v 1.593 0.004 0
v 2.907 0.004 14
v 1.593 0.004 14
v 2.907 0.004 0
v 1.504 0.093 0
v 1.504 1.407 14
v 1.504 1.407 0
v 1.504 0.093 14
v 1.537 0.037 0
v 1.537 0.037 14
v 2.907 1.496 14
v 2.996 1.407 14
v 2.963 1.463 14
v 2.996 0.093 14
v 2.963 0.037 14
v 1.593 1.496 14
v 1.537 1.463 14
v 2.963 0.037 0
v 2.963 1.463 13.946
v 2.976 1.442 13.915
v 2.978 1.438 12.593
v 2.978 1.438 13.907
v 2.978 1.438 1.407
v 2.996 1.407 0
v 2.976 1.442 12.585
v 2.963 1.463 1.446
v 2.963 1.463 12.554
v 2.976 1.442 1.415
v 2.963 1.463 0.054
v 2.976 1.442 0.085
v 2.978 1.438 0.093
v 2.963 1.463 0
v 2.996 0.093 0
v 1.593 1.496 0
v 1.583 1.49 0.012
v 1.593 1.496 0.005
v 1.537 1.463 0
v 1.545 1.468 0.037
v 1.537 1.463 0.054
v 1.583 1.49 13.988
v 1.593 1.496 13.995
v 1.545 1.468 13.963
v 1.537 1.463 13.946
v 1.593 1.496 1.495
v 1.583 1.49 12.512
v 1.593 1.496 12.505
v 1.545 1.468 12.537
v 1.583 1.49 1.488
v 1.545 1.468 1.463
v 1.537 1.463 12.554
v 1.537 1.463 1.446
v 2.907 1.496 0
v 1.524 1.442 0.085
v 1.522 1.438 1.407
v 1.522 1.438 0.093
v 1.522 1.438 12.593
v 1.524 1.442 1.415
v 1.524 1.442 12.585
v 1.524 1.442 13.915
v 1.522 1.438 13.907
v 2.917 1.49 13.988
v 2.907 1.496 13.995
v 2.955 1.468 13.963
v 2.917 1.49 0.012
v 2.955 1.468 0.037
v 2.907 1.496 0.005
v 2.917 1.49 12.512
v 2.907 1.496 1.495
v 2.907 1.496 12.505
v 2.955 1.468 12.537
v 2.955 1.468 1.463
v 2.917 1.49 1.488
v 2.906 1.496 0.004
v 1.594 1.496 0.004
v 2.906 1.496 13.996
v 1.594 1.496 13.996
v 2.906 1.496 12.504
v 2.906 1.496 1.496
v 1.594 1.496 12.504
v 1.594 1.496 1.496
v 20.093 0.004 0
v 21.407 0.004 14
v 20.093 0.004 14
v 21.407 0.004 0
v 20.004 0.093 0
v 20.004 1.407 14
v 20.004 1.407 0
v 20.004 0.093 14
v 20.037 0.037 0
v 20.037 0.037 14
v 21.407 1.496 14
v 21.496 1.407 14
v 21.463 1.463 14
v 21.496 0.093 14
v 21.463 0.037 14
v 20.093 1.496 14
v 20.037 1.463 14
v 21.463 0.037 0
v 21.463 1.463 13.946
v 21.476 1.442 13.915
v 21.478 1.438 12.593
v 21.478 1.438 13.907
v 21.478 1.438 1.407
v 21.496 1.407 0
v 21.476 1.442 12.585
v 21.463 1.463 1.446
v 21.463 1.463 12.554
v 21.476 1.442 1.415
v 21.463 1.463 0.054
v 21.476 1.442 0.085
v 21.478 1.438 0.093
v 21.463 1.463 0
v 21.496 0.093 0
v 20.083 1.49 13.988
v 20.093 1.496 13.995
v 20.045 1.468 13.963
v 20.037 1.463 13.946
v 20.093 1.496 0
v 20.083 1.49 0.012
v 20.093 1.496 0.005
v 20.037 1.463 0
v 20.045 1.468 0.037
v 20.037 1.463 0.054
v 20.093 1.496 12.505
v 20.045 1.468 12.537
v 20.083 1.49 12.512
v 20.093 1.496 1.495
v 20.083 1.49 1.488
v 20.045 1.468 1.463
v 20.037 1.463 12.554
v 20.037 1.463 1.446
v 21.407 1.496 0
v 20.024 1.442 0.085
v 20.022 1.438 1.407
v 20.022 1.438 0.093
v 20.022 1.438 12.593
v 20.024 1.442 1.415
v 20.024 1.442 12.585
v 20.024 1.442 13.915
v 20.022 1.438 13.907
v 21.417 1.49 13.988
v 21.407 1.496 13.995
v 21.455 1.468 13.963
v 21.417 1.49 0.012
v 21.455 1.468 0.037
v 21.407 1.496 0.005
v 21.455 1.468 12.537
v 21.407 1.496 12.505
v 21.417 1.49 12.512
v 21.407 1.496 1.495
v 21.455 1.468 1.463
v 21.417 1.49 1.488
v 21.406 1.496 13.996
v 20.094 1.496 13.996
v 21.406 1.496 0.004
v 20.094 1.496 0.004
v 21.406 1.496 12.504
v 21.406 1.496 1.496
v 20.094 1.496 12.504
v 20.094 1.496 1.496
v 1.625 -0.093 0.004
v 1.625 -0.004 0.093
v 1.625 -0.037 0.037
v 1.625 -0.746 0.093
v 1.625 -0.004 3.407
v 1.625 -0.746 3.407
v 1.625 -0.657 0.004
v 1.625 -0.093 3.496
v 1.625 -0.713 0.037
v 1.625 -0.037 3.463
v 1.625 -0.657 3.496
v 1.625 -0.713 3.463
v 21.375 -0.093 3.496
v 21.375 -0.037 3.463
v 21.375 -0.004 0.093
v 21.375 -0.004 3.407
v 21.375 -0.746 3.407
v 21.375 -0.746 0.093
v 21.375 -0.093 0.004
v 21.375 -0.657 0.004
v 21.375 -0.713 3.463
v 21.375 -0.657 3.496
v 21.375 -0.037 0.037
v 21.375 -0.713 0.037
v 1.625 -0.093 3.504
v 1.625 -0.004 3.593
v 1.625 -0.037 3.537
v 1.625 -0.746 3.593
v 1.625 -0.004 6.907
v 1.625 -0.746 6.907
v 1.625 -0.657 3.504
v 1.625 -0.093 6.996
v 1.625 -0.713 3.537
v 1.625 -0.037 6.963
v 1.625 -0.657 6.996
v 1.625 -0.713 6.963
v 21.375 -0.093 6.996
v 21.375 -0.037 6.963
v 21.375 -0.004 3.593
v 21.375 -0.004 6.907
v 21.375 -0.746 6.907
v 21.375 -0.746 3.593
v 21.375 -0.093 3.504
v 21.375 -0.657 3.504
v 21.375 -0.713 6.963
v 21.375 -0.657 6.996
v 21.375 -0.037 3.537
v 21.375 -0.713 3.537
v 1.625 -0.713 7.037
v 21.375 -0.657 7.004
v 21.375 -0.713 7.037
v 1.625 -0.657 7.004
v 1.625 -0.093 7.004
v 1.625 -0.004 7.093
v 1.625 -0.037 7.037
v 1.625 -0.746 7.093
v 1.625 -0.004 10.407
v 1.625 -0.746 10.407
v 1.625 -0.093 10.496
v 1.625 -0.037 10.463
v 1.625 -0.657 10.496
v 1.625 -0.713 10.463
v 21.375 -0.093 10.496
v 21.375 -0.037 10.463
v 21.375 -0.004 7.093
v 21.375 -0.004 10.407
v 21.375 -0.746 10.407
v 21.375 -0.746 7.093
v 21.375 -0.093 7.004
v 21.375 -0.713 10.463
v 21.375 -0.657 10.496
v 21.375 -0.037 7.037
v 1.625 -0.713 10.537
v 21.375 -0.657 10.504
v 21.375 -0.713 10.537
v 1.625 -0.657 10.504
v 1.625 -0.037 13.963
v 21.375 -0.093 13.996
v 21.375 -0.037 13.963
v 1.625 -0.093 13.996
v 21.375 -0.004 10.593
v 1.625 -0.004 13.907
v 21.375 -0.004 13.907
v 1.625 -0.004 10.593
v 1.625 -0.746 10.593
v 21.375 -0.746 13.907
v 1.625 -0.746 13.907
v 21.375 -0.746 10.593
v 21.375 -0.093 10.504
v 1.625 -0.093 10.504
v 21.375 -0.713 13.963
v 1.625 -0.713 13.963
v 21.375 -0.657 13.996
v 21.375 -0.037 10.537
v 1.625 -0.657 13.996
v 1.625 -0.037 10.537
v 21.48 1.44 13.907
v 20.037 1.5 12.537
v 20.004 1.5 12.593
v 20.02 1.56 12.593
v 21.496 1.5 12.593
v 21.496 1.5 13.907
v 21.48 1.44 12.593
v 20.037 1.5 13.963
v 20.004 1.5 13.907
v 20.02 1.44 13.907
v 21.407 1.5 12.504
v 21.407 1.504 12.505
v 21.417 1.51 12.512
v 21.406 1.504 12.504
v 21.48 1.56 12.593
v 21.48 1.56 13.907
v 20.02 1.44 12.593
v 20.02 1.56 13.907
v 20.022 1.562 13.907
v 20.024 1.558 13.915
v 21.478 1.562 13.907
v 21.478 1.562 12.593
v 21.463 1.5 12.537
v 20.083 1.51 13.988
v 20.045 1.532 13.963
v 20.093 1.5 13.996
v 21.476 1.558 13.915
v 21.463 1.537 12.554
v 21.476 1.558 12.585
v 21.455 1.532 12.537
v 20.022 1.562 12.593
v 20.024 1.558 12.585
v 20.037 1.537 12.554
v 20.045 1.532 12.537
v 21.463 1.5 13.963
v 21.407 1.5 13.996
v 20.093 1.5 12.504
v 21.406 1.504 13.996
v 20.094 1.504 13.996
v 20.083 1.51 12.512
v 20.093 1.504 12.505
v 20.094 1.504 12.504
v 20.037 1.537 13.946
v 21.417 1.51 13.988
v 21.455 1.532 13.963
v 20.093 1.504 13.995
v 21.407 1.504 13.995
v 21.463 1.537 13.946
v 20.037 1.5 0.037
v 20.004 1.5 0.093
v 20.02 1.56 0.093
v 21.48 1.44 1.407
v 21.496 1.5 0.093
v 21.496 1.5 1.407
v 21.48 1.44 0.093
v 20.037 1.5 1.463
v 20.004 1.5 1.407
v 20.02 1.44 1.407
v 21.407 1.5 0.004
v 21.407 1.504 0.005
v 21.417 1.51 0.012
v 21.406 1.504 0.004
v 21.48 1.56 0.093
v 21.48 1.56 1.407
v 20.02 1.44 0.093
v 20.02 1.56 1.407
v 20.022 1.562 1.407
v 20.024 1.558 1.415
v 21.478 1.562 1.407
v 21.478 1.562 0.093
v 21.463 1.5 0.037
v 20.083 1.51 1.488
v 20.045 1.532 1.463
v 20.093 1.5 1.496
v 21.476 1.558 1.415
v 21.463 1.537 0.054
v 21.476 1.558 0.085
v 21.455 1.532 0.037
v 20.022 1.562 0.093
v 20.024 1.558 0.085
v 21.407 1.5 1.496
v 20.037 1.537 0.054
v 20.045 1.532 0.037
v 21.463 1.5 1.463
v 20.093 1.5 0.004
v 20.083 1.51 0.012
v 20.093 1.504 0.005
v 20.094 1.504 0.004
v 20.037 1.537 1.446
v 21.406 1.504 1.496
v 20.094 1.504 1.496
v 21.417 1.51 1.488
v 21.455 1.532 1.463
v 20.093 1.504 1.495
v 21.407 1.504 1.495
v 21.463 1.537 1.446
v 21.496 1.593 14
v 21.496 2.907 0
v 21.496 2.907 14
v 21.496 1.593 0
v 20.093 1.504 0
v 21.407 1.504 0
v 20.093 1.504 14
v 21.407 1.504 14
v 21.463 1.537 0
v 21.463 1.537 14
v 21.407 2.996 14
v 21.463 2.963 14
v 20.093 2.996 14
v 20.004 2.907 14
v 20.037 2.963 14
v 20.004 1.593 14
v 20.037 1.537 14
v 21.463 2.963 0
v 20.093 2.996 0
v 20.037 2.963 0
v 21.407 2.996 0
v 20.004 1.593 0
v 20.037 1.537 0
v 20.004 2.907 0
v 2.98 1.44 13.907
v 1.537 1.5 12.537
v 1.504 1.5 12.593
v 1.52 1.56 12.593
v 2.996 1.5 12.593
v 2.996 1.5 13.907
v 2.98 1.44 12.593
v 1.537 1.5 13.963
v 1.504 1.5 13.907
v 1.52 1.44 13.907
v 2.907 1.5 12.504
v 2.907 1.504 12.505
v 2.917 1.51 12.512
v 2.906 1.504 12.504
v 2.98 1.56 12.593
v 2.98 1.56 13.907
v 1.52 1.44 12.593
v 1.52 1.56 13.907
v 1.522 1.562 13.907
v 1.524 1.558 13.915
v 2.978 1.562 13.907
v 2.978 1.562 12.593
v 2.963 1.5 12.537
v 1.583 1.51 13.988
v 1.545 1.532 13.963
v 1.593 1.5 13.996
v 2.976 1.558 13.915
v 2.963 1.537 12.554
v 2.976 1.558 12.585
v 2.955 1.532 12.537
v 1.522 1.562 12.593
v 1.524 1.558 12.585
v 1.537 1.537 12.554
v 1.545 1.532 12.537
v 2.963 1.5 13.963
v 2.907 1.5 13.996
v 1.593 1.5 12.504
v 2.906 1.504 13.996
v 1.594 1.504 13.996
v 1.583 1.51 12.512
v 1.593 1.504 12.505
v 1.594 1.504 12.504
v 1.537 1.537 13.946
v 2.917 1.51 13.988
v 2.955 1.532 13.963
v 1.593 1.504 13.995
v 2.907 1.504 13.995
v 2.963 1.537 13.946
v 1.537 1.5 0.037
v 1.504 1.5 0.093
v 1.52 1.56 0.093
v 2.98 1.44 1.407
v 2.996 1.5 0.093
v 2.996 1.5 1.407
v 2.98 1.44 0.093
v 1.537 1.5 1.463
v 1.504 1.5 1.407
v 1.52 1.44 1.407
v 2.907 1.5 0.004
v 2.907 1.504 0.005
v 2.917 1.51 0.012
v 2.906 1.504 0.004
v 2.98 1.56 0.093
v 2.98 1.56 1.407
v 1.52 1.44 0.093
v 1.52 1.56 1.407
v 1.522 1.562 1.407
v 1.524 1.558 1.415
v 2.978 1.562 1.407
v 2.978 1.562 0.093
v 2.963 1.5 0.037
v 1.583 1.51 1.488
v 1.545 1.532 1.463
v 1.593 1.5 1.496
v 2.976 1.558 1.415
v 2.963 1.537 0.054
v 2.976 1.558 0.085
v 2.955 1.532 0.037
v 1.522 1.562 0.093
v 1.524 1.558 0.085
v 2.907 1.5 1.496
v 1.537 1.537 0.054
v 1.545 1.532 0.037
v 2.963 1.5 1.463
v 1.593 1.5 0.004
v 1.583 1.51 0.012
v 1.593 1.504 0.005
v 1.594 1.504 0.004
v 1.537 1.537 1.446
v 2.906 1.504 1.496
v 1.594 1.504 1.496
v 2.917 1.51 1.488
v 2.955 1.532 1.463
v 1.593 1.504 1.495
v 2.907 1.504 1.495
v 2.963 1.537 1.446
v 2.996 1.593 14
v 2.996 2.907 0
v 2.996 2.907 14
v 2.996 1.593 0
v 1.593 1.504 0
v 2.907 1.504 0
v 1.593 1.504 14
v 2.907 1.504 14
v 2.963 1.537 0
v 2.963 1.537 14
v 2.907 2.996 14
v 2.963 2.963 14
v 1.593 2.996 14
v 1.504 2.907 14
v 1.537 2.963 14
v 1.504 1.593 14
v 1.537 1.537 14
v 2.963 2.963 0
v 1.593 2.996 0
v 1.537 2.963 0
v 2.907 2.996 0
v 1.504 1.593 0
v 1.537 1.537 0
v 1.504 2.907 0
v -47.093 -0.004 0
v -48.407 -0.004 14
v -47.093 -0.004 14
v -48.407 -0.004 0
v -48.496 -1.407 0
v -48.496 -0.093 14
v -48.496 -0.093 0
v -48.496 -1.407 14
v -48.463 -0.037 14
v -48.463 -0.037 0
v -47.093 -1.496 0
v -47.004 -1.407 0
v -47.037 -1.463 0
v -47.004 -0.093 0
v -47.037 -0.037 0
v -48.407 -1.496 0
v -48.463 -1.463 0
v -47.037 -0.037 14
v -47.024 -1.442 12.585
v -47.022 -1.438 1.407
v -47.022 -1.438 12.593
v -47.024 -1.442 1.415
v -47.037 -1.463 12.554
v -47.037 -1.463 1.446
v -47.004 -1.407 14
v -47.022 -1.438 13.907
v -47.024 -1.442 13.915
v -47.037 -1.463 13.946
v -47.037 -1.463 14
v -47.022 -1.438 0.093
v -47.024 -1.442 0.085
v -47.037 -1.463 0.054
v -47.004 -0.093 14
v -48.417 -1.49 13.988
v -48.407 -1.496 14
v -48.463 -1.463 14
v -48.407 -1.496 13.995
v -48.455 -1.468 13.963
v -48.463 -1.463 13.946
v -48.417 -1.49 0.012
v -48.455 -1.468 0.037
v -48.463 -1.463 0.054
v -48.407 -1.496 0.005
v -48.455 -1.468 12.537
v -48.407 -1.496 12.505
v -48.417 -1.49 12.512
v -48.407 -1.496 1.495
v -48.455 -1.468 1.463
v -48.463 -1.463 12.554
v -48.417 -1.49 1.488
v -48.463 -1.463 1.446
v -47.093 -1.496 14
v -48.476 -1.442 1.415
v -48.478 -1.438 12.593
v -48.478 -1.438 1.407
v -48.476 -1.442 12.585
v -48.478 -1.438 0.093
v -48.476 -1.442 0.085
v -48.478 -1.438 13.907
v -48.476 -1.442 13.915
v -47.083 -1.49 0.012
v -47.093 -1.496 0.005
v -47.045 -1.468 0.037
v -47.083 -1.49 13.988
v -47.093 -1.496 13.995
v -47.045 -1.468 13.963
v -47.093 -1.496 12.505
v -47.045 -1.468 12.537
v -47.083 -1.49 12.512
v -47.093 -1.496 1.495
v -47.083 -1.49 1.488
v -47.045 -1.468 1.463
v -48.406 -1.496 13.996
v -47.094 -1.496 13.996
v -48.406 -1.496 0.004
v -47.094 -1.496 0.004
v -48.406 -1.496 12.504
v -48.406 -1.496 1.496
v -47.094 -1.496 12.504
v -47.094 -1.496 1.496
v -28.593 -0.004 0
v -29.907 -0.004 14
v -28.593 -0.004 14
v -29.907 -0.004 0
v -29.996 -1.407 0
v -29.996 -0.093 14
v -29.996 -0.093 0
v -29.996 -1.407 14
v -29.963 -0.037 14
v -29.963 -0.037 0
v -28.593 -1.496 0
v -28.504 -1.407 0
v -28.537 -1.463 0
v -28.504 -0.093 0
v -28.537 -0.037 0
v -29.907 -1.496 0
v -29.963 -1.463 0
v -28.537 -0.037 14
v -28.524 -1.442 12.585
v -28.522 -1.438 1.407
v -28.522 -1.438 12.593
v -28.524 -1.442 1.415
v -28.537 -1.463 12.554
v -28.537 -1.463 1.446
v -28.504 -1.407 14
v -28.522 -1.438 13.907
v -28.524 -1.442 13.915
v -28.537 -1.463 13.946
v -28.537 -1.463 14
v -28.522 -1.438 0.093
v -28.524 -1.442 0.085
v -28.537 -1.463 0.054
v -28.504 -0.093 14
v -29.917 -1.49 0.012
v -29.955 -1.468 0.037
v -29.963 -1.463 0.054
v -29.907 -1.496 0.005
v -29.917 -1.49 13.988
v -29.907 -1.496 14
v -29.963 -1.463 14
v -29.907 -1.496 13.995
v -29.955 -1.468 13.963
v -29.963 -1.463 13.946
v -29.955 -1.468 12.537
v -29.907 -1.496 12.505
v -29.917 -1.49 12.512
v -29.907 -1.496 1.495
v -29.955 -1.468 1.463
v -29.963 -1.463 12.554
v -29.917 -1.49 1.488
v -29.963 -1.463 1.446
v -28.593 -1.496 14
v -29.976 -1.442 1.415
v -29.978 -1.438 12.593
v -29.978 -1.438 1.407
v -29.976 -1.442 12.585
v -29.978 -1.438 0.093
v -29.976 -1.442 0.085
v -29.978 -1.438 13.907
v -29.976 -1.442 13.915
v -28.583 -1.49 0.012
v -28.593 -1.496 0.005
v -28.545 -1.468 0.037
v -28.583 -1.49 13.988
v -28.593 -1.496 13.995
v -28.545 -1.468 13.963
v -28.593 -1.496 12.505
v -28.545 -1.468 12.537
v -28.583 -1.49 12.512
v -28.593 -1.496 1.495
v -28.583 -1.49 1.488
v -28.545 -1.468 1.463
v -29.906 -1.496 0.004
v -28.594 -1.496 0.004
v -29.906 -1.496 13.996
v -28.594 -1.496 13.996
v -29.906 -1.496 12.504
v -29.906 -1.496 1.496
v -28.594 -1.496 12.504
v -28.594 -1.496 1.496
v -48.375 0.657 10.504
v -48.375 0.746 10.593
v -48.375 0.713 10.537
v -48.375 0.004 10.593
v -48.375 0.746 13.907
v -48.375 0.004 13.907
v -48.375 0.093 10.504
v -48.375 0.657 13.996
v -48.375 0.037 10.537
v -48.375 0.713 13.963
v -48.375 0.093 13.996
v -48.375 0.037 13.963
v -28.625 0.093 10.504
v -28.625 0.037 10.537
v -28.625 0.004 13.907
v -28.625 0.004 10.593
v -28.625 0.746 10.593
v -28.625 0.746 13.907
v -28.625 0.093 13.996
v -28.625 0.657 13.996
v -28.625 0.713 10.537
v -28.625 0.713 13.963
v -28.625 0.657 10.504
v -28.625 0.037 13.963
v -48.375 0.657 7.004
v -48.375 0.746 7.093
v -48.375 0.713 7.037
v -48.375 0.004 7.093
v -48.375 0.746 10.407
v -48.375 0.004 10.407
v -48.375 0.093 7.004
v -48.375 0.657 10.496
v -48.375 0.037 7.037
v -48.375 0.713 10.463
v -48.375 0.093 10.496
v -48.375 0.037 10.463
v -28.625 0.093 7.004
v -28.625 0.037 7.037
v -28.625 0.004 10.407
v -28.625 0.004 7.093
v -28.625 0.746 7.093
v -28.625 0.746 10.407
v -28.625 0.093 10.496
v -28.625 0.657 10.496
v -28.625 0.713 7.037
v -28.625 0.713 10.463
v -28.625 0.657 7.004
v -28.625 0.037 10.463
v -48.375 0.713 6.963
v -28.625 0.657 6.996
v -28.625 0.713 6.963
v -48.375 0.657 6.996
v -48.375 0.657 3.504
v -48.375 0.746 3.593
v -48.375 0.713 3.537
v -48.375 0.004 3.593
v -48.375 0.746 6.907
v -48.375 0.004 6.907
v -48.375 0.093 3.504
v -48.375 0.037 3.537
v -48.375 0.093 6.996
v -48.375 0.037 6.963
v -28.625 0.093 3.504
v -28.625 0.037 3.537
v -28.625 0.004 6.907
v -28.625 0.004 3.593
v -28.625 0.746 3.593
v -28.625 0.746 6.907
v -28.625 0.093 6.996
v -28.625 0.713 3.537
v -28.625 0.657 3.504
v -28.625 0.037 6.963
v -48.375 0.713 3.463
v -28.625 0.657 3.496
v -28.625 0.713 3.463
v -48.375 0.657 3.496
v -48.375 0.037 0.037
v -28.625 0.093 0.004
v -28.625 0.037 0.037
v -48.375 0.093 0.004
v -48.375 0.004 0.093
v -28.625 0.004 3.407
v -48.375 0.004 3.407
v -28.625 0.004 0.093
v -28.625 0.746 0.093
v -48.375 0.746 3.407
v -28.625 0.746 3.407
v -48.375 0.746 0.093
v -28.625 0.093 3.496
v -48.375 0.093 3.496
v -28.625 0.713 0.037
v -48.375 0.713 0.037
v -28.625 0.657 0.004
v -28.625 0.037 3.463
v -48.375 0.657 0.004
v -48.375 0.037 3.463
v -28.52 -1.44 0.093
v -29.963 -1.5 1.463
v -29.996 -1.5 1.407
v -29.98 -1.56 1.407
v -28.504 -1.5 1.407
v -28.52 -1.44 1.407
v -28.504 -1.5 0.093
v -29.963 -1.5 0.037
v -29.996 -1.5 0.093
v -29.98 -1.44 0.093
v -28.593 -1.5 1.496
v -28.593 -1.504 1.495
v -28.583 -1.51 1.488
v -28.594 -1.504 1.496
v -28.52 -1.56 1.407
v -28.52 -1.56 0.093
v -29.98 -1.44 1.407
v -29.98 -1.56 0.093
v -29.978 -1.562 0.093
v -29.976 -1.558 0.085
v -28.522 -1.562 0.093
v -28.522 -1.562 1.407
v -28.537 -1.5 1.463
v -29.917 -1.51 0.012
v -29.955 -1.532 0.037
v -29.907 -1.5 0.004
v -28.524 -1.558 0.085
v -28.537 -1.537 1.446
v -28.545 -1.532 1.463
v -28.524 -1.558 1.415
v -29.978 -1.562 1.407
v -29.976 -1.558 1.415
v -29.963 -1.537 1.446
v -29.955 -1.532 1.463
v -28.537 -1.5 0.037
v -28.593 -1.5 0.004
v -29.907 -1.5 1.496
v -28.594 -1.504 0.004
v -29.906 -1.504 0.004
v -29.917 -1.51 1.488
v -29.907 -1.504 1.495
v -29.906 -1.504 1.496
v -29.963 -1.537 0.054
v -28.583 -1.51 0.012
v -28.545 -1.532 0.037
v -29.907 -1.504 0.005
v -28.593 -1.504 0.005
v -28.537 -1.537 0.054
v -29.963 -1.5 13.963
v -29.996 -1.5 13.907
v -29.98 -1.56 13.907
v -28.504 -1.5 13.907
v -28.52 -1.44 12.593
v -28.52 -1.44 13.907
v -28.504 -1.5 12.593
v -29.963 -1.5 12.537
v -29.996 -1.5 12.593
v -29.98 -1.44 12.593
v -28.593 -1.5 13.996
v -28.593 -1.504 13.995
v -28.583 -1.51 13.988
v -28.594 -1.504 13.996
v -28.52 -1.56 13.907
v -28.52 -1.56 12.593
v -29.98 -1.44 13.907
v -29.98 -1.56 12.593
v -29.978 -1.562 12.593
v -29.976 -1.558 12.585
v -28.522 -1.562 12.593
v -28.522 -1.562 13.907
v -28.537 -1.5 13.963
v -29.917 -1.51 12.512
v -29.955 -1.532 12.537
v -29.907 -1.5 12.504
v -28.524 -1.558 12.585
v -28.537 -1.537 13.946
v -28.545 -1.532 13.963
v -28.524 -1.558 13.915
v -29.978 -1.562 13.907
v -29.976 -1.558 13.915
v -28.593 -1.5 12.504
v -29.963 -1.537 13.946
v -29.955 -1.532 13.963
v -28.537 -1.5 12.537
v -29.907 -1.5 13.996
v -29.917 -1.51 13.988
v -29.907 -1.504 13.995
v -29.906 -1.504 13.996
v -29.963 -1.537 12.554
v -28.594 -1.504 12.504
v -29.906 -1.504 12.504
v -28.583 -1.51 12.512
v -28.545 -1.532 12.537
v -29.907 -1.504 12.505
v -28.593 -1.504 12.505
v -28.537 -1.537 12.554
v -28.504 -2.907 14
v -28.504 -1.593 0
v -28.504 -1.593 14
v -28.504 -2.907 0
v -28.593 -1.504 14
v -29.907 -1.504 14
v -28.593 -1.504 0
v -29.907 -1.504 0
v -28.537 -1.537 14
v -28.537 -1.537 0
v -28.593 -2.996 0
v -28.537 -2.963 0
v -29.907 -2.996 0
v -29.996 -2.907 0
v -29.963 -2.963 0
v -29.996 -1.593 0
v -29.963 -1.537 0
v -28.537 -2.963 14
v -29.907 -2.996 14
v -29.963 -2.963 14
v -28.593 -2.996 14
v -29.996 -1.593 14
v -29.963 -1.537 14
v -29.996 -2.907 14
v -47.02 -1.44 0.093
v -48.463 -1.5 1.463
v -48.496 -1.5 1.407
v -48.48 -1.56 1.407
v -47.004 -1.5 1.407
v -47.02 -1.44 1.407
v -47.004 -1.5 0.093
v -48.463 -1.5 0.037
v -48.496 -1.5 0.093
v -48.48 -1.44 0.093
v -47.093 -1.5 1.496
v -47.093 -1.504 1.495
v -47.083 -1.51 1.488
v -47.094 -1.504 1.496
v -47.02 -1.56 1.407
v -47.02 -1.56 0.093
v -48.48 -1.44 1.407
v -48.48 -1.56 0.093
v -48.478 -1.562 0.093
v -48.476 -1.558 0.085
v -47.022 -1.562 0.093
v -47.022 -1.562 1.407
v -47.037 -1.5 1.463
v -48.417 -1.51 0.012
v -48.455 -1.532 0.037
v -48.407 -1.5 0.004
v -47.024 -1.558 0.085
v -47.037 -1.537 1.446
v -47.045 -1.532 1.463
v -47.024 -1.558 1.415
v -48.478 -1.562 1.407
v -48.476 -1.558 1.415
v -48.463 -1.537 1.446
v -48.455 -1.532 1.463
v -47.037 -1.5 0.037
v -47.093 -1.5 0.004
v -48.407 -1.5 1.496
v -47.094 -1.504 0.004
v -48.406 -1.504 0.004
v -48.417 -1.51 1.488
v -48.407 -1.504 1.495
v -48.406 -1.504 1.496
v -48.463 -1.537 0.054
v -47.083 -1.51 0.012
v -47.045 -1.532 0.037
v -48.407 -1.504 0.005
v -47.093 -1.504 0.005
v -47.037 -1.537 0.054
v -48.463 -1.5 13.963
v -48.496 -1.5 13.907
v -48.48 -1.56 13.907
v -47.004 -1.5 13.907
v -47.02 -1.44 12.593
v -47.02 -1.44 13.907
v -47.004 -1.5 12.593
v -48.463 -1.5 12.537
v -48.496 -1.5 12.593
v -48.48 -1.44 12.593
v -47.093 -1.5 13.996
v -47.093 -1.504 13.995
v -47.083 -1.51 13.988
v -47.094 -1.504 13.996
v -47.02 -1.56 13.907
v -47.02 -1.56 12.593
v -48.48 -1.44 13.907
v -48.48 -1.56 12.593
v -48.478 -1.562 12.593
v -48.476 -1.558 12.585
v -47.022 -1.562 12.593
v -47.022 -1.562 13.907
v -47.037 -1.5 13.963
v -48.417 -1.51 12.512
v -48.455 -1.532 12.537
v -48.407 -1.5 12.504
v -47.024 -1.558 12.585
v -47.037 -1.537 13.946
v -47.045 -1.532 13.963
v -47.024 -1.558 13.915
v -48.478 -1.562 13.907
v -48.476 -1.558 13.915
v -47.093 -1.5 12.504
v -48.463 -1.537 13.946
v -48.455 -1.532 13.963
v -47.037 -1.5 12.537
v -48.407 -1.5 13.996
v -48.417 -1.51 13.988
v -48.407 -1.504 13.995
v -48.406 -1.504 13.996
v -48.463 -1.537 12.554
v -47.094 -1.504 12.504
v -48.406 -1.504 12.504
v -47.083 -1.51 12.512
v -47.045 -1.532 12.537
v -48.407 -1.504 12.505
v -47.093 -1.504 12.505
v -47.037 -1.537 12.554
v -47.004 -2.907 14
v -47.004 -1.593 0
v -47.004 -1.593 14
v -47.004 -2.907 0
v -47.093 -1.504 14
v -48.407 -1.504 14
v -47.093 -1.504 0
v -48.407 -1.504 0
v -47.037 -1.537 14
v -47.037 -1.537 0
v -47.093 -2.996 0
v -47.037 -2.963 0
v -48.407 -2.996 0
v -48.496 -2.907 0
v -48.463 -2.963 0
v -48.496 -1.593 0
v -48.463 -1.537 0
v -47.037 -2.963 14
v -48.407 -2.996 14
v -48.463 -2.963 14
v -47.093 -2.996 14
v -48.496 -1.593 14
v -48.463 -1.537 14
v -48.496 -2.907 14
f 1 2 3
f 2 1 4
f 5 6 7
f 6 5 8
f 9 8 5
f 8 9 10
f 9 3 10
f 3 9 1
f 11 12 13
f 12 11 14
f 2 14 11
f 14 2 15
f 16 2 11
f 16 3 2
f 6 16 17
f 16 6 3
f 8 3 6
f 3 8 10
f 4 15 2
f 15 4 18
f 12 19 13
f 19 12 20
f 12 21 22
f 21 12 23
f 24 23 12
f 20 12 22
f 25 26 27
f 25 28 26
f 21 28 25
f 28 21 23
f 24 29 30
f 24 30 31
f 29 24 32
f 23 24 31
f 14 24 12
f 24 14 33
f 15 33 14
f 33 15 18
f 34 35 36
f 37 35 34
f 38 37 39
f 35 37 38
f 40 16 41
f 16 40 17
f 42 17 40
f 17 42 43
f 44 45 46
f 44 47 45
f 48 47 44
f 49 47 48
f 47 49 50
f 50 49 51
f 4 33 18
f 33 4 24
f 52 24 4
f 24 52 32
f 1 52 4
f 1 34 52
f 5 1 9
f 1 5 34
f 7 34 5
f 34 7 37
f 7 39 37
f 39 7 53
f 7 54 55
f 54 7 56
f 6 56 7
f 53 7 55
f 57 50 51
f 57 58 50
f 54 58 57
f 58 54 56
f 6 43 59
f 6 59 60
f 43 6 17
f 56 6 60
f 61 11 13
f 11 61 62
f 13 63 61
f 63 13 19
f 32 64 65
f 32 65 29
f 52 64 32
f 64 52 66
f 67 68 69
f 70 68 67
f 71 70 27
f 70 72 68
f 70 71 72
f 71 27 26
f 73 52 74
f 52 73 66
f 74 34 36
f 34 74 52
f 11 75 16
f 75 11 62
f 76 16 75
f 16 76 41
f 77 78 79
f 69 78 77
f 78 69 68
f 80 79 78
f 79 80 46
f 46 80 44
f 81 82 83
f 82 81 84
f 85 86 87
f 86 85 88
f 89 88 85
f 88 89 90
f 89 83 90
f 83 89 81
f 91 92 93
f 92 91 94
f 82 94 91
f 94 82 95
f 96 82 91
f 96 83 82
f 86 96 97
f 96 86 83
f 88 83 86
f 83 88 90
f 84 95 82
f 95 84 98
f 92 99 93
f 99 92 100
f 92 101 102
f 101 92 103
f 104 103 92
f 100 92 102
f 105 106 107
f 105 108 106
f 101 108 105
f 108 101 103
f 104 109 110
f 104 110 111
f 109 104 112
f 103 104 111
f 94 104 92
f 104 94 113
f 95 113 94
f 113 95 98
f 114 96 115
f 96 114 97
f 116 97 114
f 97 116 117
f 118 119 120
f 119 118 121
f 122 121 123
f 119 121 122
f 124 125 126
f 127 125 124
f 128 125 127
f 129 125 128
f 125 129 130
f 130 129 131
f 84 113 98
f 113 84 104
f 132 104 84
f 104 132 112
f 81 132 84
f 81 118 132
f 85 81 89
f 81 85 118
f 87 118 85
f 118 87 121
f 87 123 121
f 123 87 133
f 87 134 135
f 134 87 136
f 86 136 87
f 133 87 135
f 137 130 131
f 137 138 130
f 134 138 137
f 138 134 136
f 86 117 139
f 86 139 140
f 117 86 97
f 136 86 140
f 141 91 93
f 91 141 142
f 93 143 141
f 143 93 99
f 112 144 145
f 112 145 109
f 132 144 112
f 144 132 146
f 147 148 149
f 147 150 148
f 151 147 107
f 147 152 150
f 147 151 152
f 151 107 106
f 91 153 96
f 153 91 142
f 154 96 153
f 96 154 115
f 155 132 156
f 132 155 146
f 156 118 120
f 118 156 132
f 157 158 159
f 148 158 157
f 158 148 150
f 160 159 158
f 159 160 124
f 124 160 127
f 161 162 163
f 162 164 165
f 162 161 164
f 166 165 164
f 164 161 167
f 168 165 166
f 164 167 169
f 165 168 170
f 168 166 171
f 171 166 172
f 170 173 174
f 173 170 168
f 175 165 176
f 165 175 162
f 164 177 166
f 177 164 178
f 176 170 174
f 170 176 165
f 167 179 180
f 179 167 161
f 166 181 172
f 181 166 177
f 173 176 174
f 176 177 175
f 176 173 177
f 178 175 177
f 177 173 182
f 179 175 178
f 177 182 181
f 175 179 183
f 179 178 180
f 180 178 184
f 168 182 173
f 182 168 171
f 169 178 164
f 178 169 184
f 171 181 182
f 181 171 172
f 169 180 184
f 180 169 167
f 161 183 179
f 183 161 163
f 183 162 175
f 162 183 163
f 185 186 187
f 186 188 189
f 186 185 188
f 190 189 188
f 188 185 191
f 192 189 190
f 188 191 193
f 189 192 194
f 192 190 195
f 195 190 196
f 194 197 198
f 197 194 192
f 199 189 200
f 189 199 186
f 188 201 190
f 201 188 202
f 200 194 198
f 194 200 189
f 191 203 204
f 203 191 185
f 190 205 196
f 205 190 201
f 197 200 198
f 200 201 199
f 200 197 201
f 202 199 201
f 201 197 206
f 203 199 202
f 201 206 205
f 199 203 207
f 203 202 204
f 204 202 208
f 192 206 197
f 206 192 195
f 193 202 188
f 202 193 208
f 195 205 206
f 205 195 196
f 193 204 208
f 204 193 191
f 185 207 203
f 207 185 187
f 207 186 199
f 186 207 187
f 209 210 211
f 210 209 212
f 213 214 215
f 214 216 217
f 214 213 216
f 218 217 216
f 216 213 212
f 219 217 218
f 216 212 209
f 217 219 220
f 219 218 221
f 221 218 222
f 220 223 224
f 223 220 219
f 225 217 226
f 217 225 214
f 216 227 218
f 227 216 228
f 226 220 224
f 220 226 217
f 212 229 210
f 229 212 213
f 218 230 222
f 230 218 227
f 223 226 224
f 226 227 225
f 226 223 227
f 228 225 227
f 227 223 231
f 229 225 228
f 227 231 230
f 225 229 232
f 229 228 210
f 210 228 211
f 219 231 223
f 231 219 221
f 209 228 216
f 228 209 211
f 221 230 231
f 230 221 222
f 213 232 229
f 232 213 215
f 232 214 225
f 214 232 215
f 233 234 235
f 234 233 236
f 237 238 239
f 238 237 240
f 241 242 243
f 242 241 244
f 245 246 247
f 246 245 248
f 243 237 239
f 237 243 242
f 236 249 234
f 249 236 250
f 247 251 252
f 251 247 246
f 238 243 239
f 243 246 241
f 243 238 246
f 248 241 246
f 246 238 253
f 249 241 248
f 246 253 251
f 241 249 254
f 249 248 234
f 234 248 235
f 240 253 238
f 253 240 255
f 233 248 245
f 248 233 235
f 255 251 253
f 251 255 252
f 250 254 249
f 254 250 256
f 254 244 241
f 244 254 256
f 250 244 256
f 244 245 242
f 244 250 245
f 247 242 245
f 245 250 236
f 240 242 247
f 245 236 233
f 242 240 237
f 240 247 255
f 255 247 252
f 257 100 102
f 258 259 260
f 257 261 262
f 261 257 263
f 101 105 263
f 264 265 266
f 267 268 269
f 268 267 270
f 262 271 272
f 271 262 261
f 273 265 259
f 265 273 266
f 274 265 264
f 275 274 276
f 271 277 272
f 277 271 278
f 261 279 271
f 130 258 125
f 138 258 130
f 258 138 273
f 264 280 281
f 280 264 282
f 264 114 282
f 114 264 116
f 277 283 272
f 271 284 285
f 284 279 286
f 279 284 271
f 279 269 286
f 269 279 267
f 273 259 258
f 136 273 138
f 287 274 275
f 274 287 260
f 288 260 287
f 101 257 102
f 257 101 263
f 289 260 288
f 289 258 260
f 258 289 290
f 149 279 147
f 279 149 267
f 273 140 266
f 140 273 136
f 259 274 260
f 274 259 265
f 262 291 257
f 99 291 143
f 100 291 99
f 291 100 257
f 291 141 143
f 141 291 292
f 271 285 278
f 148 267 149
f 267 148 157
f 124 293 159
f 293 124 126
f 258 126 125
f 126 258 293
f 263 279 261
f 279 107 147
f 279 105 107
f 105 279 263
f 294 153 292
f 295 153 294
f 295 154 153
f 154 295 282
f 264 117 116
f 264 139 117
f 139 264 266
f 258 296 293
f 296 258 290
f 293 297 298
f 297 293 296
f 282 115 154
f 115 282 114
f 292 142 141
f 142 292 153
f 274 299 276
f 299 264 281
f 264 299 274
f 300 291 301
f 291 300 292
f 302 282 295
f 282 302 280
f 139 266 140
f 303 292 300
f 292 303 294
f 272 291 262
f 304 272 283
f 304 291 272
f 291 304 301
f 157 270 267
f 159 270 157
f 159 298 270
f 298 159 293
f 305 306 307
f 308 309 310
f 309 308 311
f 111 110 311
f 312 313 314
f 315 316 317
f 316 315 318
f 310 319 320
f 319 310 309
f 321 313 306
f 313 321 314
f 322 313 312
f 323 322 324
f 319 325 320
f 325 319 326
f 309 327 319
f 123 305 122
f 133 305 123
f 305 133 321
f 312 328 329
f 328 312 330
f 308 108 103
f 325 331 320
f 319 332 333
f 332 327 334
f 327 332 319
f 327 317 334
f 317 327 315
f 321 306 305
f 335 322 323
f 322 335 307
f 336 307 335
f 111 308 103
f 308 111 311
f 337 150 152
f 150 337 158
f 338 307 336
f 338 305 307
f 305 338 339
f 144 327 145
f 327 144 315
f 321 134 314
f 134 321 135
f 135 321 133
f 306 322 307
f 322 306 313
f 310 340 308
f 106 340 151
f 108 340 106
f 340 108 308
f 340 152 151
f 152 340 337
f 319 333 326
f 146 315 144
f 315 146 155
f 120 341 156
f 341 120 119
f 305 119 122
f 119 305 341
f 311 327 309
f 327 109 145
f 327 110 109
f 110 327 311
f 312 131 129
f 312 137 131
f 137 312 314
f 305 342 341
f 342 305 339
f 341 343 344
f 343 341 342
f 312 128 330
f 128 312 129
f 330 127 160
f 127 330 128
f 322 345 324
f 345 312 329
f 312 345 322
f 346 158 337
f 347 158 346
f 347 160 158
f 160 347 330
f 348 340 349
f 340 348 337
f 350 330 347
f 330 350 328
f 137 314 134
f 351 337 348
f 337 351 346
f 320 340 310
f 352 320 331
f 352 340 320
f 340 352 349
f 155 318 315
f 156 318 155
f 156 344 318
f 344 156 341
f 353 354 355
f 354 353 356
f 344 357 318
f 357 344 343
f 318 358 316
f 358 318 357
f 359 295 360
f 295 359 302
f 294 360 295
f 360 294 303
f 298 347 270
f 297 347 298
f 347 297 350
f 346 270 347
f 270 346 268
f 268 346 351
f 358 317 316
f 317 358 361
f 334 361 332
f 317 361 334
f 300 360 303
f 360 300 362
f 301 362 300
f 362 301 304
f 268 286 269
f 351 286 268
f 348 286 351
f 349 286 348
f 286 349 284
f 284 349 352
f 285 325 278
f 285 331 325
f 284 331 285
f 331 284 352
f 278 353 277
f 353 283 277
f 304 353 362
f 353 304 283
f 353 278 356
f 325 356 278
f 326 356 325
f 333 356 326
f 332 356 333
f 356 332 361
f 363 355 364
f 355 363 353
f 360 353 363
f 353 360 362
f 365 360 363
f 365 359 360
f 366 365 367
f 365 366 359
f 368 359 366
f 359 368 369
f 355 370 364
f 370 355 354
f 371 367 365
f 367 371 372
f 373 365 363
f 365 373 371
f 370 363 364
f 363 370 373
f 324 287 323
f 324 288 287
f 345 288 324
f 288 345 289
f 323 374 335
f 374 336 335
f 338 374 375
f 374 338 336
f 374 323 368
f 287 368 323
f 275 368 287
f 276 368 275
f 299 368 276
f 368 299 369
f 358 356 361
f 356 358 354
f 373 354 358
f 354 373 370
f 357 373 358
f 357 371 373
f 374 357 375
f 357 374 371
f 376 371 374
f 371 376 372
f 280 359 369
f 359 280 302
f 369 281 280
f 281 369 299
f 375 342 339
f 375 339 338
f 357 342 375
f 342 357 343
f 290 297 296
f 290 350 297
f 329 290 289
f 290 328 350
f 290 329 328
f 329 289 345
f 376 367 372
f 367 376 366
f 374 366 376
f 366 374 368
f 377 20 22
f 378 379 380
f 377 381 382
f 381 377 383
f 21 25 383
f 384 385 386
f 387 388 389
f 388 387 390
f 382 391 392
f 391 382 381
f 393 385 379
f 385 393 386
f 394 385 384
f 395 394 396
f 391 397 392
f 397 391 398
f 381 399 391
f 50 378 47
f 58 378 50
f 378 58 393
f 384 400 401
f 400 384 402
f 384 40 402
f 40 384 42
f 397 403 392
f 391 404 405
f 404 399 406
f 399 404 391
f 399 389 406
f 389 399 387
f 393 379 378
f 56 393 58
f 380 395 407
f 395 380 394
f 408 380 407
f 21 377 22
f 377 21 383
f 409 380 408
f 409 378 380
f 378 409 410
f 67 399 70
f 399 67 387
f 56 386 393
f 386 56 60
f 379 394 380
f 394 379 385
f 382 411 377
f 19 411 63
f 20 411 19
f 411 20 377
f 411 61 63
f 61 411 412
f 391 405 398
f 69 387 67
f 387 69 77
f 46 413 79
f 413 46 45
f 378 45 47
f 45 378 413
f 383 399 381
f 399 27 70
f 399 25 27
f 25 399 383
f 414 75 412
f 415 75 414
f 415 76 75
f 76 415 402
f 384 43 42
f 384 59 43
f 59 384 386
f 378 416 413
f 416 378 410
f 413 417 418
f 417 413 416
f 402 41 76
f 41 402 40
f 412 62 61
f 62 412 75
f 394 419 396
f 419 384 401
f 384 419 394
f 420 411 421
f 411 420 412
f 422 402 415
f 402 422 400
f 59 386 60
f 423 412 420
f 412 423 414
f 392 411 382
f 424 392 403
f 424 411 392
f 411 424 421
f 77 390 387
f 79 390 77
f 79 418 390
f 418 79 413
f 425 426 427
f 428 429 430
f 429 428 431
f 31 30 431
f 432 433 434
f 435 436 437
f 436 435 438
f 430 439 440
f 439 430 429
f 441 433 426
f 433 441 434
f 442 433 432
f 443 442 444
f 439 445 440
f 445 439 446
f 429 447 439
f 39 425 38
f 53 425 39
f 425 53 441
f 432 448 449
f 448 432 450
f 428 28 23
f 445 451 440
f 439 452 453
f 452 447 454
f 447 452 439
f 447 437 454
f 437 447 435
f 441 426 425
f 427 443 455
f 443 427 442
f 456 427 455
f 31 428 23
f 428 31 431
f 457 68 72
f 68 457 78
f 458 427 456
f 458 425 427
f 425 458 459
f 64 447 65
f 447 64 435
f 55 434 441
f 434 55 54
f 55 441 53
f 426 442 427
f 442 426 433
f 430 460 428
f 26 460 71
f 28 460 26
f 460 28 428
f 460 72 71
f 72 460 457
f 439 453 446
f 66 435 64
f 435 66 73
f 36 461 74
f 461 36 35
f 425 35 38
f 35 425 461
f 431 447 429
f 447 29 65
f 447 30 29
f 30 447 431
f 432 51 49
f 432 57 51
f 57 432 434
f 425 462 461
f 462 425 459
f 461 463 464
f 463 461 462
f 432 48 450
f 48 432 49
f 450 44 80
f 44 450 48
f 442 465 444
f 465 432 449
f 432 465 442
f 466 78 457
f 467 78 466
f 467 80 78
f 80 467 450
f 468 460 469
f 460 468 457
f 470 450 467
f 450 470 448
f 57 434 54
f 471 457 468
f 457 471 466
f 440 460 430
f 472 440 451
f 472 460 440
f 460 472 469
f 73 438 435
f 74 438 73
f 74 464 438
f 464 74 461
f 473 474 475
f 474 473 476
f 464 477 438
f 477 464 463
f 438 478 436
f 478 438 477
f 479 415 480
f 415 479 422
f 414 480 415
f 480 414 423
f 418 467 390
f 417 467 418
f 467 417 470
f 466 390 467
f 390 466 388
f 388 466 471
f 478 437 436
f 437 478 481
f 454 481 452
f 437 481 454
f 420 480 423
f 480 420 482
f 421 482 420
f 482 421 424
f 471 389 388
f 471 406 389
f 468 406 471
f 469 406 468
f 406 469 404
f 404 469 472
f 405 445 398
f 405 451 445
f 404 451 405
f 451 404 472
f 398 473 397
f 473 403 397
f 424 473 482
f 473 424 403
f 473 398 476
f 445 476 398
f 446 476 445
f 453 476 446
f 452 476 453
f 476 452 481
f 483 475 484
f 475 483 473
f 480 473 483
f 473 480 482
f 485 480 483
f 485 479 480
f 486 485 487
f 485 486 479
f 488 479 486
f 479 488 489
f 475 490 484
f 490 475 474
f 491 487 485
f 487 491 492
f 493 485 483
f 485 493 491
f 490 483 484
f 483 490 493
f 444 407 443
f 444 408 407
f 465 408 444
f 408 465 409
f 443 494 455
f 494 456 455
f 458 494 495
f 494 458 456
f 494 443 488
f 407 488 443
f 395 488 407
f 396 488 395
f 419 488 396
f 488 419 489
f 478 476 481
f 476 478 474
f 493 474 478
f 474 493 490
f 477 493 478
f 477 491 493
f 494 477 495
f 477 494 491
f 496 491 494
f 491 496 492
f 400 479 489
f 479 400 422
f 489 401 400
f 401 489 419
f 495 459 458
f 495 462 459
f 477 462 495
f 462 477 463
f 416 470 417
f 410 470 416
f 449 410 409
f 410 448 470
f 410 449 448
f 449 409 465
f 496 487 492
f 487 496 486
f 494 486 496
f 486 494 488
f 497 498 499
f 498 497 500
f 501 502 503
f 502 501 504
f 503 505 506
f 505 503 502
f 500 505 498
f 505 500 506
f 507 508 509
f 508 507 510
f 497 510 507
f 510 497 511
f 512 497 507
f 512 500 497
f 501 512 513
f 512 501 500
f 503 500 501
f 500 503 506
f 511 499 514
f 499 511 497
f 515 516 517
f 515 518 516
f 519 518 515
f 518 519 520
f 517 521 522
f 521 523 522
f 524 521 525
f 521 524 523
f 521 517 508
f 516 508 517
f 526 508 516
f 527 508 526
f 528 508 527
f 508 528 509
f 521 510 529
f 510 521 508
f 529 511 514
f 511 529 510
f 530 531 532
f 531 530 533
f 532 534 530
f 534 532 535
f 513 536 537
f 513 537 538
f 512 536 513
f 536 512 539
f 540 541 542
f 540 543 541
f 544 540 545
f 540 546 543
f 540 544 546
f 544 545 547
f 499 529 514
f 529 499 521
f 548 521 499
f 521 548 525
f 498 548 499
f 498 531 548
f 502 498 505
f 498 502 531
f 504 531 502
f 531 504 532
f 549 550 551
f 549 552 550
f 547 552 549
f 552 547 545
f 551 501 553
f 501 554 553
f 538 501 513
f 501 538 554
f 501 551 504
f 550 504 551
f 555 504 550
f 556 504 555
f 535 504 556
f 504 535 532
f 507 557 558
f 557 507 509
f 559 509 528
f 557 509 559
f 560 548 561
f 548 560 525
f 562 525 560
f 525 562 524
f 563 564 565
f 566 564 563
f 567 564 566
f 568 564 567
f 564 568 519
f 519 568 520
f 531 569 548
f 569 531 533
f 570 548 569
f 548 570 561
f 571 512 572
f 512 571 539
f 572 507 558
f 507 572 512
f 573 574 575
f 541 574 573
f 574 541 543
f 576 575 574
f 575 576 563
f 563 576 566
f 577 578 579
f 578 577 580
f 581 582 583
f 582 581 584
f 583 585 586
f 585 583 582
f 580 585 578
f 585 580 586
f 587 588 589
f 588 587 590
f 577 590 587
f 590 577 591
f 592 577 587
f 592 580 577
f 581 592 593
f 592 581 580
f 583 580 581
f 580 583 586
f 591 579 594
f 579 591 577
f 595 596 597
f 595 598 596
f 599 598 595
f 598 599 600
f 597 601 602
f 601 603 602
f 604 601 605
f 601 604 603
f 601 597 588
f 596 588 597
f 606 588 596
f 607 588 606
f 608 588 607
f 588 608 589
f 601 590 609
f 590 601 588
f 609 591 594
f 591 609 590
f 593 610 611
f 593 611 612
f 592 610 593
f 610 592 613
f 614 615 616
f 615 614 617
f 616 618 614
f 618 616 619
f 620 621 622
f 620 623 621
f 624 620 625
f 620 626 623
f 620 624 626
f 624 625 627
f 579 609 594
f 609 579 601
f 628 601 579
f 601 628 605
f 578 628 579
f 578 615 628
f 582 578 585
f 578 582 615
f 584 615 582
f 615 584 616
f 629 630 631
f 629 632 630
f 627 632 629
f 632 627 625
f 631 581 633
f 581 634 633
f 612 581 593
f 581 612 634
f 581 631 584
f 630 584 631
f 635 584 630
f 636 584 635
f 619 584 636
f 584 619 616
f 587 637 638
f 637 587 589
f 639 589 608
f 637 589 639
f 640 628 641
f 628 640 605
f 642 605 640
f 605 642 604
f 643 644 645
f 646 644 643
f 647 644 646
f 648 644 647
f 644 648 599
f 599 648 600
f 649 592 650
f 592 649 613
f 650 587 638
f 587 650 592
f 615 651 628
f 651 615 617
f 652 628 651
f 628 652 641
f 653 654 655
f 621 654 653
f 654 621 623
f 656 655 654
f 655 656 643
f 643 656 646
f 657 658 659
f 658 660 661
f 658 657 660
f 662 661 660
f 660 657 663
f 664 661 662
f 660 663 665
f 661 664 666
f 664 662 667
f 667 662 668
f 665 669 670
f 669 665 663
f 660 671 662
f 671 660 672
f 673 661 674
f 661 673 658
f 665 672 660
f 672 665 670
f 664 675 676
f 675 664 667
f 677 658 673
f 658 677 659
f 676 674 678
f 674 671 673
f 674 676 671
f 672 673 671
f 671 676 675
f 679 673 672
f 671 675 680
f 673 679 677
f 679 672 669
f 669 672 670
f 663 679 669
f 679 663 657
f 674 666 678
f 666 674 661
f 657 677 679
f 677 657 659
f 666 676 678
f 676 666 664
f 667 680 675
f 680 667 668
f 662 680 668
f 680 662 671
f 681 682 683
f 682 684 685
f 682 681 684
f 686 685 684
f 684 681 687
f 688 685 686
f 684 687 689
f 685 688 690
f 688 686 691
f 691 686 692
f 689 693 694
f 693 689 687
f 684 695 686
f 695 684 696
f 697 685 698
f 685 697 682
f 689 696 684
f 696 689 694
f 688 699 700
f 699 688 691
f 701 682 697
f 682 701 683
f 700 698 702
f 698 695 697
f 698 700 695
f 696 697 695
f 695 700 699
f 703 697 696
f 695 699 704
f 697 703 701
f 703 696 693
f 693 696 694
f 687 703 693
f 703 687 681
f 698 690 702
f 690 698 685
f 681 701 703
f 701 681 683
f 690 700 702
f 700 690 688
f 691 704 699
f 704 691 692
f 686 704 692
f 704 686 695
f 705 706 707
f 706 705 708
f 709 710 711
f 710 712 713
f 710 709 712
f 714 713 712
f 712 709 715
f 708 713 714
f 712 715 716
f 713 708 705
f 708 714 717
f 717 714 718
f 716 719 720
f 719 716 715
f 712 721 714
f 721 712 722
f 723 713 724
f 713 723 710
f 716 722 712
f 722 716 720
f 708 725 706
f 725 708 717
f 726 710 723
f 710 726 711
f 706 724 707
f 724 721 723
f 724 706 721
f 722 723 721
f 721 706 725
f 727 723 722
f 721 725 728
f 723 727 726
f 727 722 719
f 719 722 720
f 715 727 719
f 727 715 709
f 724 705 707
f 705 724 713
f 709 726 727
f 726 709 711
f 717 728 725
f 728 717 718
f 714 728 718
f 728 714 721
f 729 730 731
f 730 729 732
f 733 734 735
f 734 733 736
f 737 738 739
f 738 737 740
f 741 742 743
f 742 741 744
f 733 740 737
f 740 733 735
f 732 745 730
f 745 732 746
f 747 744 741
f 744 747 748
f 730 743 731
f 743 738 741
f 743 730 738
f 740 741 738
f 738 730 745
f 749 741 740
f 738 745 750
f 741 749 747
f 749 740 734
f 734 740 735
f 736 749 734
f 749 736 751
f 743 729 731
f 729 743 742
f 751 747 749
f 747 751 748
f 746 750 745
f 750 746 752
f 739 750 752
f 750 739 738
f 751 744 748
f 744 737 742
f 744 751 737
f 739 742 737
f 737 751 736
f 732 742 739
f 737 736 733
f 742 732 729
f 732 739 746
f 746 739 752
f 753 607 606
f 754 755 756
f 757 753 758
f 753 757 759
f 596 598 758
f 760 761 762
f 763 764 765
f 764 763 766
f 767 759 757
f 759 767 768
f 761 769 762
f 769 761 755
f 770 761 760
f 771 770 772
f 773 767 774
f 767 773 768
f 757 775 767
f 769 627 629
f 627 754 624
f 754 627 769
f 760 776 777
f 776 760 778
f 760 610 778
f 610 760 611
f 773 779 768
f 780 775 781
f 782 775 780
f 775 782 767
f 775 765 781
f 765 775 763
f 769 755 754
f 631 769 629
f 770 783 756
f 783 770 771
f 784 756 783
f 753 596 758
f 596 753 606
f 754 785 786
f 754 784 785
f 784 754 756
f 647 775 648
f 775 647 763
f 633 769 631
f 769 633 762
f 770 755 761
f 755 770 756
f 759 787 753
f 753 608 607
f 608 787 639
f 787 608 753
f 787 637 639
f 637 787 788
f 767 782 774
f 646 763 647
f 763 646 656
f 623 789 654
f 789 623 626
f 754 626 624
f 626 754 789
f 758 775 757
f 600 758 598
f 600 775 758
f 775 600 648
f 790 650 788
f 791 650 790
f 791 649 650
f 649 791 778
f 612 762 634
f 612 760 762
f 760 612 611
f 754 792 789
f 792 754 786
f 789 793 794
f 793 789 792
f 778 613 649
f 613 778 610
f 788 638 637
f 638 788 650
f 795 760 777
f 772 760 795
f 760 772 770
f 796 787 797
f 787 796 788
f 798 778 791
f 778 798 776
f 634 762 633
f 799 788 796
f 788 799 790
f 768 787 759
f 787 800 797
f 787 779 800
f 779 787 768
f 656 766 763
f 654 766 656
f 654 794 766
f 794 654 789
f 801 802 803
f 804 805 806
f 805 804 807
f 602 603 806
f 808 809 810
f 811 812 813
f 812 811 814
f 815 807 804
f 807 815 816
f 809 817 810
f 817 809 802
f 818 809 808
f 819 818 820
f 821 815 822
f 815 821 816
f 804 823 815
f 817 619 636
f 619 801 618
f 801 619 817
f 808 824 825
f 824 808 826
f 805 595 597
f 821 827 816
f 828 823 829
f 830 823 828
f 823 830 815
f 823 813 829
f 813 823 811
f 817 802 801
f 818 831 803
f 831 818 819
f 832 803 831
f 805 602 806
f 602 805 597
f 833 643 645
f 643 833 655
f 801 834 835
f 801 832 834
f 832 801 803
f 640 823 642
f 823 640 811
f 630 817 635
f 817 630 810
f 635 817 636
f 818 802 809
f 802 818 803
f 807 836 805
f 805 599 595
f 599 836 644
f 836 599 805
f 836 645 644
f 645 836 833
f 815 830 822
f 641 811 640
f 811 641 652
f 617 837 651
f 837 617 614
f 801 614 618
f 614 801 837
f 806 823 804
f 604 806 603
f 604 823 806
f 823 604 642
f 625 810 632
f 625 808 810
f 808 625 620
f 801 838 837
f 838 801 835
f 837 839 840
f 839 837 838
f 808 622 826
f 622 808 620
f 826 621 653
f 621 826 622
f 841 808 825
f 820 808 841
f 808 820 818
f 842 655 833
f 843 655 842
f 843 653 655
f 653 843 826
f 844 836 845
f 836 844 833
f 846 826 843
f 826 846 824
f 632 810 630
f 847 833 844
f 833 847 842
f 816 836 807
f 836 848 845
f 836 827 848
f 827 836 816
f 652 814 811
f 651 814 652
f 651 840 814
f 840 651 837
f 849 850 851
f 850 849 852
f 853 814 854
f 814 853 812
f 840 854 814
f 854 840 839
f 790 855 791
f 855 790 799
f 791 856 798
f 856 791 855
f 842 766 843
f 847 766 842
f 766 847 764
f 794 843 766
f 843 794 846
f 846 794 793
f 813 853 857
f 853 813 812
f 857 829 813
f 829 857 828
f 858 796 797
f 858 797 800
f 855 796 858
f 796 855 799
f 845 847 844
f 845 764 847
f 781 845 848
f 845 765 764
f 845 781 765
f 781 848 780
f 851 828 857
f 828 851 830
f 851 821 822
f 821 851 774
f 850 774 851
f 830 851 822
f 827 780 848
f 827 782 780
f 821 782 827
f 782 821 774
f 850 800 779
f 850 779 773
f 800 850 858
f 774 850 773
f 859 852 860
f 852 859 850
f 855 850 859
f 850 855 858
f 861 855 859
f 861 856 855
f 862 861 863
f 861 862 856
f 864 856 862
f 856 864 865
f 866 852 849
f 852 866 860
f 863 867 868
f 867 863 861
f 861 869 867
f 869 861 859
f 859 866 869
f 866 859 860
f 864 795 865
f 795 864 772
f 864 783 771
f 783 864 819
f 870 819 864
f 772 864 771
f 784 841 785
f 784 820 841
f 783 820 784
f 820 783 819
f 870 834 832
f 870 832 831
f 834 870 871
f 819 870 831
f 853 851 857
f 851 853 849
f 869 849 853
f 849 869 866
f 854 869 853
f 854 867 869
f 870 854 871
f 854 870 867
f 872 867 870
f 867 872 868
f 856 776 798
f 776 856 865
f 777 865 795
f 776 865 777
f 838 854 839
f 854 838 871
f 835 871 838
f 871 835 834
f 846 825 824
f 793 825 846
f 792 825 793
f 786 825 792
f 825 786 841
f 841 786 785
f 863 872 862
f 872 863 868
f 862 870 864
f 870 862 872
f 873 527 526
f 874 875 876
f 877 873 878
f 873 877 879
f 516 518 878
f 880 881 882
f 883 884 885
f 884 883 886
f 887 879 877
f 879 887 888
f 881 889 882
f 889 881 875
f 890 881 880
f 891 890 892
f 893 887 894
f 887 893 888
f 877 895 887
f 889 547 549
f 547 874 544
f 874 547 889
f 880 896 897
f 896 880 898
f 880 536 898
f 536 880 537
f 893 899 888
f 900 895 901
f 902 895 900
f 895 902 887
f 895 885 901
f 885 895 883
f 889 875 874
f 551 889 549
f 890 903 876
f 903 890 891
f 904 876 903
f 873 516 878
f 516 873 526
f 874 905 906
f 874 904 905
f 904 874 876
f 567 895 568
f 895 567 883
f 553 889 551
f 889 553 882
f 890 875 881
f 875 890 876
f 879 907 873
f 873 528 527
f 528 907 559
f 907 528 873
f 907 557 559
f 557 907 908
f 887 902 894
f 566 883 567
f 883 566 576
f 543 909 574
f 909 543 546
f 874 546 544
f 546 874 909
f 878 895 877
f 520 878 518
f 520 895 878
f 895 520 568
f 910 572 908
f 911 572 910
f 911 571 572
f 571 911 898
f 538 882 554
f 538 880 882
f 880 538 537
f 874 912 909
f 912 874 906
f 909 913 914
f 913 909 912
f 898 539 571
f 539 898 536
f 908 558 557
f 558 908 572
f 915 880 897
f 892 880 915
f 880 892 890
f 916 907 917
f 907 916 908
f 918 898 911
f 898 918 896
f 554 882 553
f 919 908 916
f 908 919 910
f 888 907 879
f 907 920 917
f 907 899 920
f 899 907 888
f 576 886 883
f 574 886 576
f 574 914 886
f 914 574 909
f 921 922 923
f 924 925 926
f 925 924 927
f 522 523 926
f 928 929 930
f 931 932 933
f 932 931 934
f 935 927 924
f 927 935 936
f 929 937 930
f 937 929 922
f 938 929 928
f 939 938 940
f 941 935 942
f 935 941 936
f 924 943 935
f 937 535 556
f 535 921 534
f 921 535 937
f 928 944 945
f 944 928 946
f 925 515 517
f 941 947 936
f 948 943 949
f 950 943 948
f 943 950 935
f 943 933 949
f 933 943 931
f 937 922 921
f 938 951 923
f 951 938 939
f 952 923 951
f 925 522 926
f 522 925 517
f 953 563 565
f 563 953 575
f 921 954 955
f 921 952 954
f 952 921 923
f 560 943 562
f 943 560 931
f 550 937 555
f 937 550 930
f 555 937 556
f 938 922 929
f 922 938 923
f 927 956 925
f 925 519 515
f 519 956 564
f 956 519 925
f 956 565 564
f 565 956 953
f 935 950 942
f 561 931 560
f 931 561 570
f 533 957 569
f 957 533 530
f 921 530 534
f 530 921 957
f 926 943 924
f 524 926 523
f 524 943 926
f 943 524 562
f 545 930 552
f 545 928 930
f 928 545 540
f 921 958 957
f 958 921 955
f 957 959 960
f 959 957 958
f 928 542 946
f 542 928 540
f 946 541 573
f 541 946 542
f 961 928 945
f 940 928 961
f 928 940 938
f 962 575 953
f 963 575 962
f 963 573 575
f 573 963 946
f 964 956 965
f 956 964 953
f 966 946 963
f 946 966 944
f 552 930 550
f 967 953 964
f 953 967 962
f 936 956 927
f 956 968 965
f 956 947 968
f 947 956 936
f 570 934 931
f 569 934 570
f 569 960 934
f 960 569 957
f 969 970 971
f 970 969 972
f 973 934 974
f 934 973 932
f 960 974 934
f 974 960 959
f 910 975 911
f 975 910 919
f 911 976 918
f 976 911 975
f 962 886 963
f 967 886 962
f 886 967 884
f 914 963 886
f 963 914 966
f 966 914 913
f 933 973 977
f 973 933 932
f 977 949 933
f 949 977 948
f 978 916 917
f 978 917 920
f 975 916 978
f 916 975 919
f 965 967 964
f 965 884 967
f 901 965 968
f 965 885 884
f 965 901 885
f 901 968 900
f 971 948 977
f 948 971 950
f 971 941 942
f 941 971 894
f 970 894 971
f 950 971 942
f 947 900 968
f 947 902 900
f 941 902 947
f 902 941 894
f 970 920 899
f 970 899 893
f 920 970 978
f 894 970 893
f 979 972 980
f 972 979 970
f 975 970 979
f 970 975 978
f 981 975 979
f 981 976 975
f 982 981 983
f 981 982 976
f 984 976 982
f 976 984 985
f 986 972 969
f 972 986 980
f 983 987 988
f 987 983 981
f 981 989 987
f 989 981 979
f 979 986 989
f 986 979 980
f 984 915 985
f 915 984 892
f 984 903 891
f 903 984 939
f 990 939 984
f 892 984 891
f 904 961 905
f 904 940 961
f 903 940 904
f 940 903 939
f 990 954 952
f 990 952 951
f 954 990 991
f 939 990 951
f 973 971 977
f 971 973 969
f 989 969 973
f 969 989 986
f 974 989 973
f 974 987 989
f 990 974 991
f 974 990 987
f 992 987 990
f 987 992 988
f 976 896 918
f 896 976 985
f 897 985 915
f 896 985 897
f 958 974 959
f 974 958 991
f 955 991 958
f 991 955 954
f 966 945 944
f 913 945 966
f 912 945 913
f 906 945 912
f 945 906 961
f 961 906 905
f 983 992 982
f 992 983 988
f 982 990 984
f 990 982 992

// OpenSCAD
// file: ../lib/lumber.scad
include <defaults.scad>;

module two_by_two(length) {
  lumber(two_by_height, two_by_height, length);
}

module one_by_six(length) {
  lumber(one_by_height, six_by_height, length);
}

module one_by_four(length) {
  lumber(one_by_height, four_by_height, length);
}


lumber_radius=0.125;
module lumber(height, width, length) {
  hull() {
    // front
    four_half_spheres(height, width);

    // back
    translate([width, length, 0])
      rotate([0, 0, 180])
        four_half_spheres(height, width);
  }
}

module four_half_spheres(height, width) {
  translate([lumber_radius, 0, lumber_radius])
    half_sphere();
  translate([width - lumber_radius, 0, height - lumber_radius])
    half_sphere();
  translate([width - lumber_radius, 0, lumber_radius])
    half_sphere();
  translate([lumber_radius, 0, height - lumber_radius])
    half_sphere();
}

module half_sphere() {
  difference() {
    sphere(r=lumber_radius, $fn=12);
    translate([-0.5, -1, -0.5])
      cube(1);
  }
}
// file: ../lib/panel.scad
include <defaults.scad>;
use <../lib/lumber.scad>;

module panel(four_by_count, width, foot_depth=0, cover=false, edge_offset=0, verticals=true, horizontals=true) {
  height = four_by_count * four_by_height;
  final_width=width - (edge_offset*2);

  translate([0, edge_offset, 0])
    frame(height, final_width, foot_depth, verticals, horizontals);

  if (cover) {
    translate([two_by_height, 0, 0])
      cover(four_by_count, width);
  }
}

module cover(four_by_count, width) {
  for(count = [1 : four_by_count])
    translate([0, 0.125, four_by_height * count])
      rotate([0, 90, 0])
        one_by_four(width - 0.25);
}

module frame(height, width, foot_depth, verticals=true, horizontals=true) {
  if (horizontals) {
    final_width = verticals ? width - (two_by_height * 2) : width;
    y_position = verticals ? two_by_height : 0;

    // top 2x2
    translate([0, y_position, height-two_by_height])
      two_by_two(final_width);

    // bottom 2x2
    translate([0, y_position, 0])
      two_by_two(final_width);
  }

  if (verticals) {
    // left 2x2
    translate([0, two_by_height, -foot_depth])
      rotate([90, 0, 0])
        two_by_two(height + foot_depth);

    // right 2x2
    translate([0, width, -foot_depth])
      rotate([90, 0, 0])
        two_by_two(height + foot_depth);
  }
}
// file: ../lib/defaults.scad
one_by_height=0.75;
two_by_height=1.5;
four_by_height=3.5;
six_by_height=5.5;

foot_depth=8;
edge_offset=4.5;
exploded_offset=12;

fence_height = 5 * 12;
frame_depth = 20;
panel_length = 40;
frame_height = 4;
// main file
include <../lib/defaults.scad>;
use <../lib/panel.scad>;

module right_endcap(width, four_by_count) {
  translate([two_by_height, two_by_height, 0]) {
    rotate([0, 0, 270]) {
      panel(four_by_count, width, cover=true, horizontals=false);

      translate([two_by_height, width-two_by_height, 0])
        rotate([0, 0, 90])
          panel(four_by_count, edge_offset-two_by_height);

      translate([two_by_height, 0, 0])
        rotate([0, 0, 90])
          panel(four_by_count, edge_offset-two_by_height);
    }
  }
}

module left_endcap(width, four_by_count) {
  translate([0, 0, four_by_count * four_by_height])
  rotate([180, 0, 0])
    right_endcap(width, four_by_count);
}

right_endcap(20, 4);

translate([-50, 0, 0])
  left_endcap(20, 4);
